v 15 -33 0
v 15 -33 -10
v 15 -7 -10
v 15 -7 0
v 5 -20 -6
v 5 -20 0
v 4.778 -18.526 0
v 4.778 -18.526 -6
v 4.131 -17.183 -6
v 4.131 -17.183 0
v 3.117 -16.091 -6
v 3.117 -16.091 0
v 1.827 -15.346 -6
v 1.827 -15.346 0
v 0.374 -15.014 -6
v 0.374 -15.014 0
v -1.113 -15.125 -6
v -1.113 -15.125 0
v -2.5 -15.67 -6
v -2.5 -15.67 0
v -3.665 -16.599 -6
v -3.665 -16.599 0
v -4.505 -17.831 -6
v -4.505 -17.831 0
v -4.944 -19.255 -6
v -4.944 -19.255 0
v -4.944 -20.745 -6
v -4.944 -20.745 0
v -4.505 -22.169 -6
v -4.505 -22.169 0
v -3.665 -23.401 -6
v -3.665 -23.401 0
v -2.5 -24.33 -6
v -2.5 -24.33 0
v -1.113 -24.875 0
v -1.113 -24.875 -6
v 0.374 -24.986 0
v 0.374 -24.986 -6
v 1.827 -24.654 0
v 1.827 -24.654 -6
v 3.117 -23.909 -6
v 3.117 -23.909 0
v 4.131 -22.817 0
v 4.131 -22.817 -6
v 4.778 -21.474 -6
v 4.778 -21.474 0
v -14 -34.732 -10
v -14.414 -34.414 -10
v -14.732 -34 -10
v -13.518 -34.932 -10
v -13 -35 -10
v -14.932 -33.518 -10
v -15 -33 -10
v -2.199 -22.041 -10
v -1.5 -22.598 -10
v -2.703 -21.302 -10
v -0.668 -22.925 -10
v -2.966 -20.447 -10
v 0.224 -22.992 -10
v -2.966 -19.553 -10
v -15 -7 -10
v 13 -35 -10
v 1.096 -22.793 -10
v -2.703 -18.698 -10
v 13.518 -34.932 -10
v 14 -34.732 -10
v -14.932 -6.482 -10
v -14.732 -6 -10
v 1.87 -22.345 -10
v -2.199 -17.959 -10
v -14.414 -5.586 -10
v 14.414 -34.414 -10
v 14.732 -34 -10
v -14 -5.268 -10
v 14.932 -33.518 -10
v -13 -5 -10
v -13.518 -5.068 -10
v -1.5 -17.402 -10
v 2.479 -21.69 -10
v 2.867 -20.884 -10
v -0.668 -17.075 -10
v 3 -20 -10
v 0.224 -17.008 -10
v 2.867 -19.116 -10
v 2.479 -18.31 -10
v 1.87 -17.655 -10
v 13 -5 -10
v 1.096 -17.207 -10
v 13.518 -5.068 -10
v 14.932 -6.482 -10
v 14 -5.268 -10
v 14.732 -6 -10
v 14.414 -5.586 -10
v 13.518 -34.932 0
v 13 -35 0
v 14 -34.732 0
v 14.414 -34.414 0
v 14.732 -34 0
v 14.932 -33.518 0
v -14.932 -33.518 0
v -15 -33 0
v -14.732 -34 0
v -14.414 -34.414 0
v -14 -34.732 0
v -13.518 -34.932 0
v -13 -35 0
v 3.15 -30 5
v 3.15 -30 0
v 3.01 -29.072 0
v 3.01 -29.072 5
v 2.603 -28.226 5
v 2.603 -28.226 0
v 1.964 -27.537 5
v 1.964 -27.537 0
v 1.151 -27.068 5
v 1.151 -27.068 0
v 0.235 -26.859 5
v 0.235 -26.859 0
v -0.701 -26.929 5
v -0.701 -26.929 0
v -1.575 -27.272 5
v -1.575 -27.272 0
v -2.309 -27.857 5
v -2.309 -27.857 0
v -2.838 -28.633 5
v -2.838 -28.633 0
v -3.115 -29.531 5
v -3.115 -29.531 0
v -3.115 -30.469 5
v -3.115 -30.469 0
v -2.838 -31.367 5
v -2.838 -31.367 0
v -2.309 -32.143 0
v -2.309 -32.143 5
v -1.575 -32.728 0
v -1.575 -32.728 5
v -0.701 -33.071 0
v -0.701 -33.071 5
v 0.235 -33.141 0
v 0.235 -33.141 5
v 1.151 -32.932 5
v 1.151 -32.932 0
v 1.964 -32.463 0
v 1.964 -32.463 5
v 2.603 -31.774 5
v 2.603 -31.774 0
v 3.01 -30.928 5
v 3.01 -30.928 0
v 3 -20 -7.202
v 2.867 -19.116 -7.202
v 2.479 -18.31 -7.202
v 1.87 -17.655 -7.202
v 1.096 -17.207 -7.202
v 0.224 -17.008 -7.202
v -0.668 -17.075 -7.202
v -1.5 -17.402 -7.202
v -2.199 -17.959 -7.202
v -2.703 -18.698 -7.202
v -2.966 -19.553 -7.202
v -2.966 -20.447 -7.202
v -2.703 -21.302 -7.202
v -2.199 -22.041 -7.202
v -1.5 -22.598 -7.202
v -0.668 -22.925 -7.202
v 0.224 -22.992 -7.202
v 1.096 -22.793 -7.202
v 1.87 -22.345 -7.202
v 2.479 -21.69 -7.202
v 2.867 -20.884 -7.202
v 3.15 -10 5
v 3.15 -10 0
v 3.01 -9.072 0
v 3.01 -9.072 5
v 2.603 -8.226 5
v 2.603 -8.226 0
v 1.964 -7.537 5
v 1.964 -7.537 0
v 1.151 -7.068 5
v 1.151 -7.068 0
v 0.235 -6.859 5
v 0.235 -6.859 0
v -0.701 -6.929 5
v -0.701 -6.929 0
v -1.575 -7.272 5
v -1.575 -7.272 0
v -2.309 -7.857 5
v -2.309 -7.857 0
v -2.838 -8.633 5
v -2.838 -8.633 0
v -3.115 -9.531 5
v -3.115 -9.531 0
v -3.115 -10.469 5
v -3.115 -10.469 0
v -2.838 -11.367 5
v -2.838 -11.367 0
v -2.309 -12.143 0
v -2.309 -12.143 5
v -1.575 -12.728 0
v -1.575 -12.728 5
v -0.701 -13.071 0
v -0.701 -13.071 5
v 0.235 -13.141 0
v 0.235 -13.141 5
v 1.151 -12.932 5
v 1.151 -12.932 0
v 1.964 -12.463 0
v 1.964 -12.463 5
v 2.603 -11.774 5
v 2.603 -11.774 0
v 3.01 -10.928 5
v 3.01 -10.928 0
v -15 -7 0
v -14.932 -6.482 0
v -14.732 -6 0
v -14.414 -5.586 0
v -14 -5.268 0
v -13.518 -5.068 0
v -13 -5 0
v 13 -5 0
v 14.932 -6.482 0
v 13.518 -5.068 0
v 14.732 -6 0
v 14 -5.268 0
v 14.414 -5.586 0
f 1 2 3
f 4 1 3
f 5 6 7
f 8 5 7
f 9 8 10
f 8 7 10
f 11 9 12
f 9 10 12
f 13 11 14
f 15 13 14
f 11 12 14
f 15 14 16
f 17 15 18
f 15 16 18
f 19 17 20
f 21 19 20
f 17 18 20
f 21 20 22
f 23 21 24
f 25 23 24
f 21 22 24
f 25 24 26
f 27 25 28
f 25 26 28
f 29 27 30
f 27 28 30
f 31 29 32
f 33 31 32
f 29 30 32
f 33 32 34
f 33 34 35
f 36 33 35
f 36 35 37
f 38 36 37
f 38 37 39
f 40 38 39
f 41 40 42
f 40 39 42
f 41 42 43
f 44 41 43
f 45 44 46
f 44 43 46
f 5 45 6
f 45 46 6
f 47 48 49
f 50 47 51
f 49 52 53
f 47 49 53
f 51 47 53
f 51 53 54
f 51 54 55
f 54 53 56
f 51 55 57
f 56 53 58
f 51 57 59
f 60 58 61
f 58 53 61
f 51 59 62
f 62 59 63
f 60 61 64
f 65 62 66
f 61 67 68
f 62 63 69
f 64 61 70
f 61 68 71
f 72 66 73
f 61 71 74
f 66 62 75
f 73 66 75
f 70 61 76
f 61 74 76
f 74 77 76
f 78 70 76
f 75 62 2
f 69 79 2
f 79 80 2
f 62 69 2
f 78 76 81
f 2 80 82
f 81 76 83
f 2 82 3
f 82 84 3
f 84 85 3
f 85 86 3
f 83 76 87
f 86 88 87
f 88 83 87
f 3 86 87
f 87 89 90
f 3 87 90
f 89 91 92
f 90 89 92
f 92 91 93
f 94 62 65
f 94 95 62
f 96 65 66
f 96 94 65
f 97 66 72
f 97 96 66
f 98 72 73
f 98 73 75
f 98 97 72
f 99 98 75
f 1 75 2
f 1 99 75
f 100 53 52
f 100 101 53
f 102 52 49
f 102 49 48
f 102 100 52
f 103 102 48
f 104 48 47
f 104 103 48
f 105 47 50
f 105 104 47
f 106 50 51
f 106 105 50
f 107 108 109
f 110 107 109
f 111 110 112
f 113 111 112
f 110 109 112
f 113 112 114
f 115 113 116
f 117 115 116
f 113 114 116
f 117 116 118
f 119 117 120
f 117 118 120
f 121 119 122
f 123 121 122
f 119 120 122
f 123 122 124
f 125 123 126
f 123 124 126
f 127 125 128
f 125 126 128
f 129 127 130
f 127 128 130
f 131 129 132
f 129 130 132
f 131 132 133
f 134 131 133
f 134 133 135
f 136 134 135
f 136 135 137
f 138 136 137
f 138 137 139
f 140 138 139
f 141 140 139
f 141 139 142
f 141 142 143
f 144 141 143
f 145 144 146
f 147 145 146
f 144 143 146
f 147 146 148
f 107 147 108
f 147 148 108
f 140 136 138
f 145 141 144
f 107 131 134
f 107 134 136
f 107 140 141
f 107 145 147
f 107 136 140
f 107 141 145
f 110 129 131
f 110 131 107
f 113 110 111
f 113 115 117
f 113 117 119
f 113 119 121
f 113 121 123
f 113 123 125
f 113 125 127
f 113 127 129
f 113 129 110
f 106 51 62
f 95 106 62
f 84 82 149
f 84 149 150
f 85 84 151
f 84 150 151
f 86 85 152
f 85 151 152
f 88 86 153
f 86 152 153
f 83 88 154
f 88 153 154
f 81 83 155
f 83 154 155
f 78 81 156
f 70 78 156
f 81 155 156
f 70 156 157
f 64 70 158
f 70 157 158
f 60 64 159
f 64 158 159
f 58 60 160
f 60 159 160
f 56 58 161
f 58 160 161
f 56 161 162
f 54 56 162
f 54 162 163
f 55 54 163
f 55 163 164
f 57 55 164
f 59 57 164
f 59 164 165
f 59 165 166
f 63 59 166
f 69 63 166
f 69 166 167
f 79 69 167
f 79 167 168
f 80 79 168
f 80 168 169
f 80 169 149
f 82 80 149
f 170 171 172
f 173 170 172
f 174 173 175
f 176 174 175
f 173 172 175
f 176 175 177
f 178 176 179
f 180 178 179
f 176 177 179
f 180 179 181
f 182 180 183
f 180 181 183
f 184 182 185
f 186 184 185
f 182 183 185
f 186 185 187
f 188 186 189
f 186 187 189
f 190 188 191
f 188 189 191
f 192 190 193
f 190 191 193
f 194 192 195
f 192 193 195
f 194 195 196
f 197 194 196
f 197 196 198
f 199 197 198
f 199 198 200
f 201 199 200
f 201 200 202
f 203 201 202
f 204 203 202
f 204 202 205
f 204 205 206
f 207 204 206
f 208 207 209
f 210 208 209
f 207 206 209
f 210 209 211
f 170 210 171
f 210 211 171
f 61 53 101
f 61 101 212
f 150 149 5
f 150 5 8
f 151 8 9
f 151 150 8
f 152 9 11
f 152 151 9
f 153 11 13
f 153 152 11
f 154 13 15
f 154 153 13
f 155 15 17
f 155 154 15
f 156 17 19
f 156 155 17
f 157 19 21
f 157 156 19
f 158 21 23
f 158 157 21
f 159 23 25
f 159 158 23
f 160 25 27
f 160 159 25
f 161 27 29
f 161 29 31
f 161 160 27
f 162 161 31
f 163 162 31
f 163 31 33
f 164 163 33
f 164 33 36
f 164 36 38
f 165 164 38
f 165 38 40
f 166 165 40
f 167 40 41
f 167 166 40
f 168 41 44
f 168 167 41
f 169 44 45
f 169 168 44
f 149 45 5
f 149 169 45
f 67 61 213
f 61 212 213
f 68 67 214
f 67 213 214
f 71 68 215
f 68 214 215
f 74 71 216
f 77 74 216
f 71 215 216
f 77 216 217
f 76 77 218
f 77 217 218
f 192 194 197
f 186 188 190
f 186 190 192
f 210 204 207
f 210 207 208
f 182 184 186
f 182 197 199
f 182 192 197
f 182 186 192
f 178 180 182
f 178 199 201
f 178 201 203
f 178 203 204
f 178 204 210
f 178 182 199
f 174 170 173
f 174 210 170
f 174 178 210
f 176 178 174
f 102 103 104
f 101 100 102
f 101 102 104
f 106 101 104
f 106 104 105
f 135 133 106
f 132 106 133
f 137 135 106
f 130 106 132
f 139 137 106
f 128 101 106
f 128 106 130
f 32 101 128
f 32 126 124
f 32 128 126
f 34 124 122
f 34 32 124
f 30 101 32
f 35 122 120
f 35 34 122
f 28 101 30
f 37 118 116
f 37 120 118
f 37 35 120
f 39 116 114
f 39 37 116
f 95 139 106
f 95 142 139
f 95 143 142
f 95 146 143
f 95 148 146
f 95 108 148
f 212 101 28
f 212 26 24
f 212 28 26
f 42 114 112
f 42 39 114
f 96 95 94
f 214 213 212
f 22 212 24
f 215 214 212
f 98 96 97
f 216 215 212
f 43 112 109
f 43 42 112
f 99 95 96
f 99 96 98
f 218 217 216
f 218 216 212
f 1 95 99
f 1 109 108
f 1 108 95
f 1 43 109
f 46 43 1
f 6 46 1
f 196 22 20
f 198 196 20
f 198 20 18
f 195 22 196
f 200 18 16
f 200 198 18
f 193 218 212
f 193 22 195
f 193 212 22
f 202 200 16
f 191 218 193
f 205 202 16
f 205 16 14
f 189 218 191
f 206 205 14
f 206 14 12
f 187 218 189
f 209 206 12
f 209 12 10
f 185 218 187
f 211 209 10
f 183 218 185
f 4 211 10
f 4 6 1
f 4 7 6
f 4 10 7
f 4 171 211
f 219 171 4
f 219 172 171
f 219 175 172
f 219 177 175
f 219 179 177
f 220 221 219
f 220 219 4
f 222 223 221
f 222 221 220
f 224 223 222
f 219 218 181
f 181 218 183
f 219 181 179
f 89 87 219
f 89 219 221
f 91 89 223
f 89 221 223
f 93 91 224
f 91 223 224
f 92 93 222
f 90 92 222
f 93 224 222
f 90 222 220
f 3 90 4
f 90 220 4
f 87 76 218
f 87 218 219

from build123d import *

# Parameters (mm, degrees)
SKETCH005_W    = 30
SKETCH005_H    = 30
PAD003_DEPTH   = 10
SKETCH006_R    = 3.15
PAD004_DEPTH   = 5
SKETCH007_R    = 3
HOLE002_DEPTH  = 25
SKETCH008_R    = 5
HOLE003_DEPTH  = 6
HOLE003_TIPS_R = 5
FILLET_R       = 2


with BuildPart() as part:
    # Sketch005 → Pad003 (new body)
    with BuildSketch(Plane.XY):
        Rectangle(SKETCH005_W, SKETCH005_H)
    extrude(amount=PAD003_DEPTH)

    # Sketch006 (on Face6 of Pad003) → Pad004 (join)
    with BuildSketch(Plane.XY.offset(10)):
        with Locations((0, 10)):
            Circle(SKETCH006_R)
        with Locations((0, -10)):
            Circle(SKETCH006_R)
    extrude(amount=PAD004_DEPTH)

    # Sketch007 (on Face5 of Pad004) → Hole002 (cut)
    with BuildSketch(Plane.XY.offset(10)):
        Circle(SKETCH007_R)
    extrude(amount=-HOLE002_DEPTH, mode=Mode.SUBTRACT)

    # Sketch008 (on Face5 of Hole002) → Hole003 (cut)
    with BuildSketch(Plane.XY.offset(10)):
        Circle(SKETCH008_R)
    extrude(amount=-HOLE003_DEPTH, mode=Mode.SUBTRACT)

    # Hole003 tips → Hole003 tip 1 section 0
    with BuildSketch(Plane.XY.offset(4), mode=Mode.PRIVATE) as hole003_tip_1_s0:
        Circle(HOLE003_TIPS_R)
    loft([hole003_tip_1_s0.sketch, Vertex(0, 0, 0.995697)], mode=Mode.SUBTRACT)

    # Fillet
    fillet_edges = [part.edges().sort_by_distance(p)[0] for p in [
        (15, -15, 5),
        (-15, -15, 5),
        (-15, 15, 5),
        (15, 15, 5),
    ]]
    fillet(fillet_edges, radius=FILLET_R)


with BuildPart() as part_1:
    # Body001 placement: moved
    add(part.part.moved(Location((0, -20, -10))))


solid = part_1.part
